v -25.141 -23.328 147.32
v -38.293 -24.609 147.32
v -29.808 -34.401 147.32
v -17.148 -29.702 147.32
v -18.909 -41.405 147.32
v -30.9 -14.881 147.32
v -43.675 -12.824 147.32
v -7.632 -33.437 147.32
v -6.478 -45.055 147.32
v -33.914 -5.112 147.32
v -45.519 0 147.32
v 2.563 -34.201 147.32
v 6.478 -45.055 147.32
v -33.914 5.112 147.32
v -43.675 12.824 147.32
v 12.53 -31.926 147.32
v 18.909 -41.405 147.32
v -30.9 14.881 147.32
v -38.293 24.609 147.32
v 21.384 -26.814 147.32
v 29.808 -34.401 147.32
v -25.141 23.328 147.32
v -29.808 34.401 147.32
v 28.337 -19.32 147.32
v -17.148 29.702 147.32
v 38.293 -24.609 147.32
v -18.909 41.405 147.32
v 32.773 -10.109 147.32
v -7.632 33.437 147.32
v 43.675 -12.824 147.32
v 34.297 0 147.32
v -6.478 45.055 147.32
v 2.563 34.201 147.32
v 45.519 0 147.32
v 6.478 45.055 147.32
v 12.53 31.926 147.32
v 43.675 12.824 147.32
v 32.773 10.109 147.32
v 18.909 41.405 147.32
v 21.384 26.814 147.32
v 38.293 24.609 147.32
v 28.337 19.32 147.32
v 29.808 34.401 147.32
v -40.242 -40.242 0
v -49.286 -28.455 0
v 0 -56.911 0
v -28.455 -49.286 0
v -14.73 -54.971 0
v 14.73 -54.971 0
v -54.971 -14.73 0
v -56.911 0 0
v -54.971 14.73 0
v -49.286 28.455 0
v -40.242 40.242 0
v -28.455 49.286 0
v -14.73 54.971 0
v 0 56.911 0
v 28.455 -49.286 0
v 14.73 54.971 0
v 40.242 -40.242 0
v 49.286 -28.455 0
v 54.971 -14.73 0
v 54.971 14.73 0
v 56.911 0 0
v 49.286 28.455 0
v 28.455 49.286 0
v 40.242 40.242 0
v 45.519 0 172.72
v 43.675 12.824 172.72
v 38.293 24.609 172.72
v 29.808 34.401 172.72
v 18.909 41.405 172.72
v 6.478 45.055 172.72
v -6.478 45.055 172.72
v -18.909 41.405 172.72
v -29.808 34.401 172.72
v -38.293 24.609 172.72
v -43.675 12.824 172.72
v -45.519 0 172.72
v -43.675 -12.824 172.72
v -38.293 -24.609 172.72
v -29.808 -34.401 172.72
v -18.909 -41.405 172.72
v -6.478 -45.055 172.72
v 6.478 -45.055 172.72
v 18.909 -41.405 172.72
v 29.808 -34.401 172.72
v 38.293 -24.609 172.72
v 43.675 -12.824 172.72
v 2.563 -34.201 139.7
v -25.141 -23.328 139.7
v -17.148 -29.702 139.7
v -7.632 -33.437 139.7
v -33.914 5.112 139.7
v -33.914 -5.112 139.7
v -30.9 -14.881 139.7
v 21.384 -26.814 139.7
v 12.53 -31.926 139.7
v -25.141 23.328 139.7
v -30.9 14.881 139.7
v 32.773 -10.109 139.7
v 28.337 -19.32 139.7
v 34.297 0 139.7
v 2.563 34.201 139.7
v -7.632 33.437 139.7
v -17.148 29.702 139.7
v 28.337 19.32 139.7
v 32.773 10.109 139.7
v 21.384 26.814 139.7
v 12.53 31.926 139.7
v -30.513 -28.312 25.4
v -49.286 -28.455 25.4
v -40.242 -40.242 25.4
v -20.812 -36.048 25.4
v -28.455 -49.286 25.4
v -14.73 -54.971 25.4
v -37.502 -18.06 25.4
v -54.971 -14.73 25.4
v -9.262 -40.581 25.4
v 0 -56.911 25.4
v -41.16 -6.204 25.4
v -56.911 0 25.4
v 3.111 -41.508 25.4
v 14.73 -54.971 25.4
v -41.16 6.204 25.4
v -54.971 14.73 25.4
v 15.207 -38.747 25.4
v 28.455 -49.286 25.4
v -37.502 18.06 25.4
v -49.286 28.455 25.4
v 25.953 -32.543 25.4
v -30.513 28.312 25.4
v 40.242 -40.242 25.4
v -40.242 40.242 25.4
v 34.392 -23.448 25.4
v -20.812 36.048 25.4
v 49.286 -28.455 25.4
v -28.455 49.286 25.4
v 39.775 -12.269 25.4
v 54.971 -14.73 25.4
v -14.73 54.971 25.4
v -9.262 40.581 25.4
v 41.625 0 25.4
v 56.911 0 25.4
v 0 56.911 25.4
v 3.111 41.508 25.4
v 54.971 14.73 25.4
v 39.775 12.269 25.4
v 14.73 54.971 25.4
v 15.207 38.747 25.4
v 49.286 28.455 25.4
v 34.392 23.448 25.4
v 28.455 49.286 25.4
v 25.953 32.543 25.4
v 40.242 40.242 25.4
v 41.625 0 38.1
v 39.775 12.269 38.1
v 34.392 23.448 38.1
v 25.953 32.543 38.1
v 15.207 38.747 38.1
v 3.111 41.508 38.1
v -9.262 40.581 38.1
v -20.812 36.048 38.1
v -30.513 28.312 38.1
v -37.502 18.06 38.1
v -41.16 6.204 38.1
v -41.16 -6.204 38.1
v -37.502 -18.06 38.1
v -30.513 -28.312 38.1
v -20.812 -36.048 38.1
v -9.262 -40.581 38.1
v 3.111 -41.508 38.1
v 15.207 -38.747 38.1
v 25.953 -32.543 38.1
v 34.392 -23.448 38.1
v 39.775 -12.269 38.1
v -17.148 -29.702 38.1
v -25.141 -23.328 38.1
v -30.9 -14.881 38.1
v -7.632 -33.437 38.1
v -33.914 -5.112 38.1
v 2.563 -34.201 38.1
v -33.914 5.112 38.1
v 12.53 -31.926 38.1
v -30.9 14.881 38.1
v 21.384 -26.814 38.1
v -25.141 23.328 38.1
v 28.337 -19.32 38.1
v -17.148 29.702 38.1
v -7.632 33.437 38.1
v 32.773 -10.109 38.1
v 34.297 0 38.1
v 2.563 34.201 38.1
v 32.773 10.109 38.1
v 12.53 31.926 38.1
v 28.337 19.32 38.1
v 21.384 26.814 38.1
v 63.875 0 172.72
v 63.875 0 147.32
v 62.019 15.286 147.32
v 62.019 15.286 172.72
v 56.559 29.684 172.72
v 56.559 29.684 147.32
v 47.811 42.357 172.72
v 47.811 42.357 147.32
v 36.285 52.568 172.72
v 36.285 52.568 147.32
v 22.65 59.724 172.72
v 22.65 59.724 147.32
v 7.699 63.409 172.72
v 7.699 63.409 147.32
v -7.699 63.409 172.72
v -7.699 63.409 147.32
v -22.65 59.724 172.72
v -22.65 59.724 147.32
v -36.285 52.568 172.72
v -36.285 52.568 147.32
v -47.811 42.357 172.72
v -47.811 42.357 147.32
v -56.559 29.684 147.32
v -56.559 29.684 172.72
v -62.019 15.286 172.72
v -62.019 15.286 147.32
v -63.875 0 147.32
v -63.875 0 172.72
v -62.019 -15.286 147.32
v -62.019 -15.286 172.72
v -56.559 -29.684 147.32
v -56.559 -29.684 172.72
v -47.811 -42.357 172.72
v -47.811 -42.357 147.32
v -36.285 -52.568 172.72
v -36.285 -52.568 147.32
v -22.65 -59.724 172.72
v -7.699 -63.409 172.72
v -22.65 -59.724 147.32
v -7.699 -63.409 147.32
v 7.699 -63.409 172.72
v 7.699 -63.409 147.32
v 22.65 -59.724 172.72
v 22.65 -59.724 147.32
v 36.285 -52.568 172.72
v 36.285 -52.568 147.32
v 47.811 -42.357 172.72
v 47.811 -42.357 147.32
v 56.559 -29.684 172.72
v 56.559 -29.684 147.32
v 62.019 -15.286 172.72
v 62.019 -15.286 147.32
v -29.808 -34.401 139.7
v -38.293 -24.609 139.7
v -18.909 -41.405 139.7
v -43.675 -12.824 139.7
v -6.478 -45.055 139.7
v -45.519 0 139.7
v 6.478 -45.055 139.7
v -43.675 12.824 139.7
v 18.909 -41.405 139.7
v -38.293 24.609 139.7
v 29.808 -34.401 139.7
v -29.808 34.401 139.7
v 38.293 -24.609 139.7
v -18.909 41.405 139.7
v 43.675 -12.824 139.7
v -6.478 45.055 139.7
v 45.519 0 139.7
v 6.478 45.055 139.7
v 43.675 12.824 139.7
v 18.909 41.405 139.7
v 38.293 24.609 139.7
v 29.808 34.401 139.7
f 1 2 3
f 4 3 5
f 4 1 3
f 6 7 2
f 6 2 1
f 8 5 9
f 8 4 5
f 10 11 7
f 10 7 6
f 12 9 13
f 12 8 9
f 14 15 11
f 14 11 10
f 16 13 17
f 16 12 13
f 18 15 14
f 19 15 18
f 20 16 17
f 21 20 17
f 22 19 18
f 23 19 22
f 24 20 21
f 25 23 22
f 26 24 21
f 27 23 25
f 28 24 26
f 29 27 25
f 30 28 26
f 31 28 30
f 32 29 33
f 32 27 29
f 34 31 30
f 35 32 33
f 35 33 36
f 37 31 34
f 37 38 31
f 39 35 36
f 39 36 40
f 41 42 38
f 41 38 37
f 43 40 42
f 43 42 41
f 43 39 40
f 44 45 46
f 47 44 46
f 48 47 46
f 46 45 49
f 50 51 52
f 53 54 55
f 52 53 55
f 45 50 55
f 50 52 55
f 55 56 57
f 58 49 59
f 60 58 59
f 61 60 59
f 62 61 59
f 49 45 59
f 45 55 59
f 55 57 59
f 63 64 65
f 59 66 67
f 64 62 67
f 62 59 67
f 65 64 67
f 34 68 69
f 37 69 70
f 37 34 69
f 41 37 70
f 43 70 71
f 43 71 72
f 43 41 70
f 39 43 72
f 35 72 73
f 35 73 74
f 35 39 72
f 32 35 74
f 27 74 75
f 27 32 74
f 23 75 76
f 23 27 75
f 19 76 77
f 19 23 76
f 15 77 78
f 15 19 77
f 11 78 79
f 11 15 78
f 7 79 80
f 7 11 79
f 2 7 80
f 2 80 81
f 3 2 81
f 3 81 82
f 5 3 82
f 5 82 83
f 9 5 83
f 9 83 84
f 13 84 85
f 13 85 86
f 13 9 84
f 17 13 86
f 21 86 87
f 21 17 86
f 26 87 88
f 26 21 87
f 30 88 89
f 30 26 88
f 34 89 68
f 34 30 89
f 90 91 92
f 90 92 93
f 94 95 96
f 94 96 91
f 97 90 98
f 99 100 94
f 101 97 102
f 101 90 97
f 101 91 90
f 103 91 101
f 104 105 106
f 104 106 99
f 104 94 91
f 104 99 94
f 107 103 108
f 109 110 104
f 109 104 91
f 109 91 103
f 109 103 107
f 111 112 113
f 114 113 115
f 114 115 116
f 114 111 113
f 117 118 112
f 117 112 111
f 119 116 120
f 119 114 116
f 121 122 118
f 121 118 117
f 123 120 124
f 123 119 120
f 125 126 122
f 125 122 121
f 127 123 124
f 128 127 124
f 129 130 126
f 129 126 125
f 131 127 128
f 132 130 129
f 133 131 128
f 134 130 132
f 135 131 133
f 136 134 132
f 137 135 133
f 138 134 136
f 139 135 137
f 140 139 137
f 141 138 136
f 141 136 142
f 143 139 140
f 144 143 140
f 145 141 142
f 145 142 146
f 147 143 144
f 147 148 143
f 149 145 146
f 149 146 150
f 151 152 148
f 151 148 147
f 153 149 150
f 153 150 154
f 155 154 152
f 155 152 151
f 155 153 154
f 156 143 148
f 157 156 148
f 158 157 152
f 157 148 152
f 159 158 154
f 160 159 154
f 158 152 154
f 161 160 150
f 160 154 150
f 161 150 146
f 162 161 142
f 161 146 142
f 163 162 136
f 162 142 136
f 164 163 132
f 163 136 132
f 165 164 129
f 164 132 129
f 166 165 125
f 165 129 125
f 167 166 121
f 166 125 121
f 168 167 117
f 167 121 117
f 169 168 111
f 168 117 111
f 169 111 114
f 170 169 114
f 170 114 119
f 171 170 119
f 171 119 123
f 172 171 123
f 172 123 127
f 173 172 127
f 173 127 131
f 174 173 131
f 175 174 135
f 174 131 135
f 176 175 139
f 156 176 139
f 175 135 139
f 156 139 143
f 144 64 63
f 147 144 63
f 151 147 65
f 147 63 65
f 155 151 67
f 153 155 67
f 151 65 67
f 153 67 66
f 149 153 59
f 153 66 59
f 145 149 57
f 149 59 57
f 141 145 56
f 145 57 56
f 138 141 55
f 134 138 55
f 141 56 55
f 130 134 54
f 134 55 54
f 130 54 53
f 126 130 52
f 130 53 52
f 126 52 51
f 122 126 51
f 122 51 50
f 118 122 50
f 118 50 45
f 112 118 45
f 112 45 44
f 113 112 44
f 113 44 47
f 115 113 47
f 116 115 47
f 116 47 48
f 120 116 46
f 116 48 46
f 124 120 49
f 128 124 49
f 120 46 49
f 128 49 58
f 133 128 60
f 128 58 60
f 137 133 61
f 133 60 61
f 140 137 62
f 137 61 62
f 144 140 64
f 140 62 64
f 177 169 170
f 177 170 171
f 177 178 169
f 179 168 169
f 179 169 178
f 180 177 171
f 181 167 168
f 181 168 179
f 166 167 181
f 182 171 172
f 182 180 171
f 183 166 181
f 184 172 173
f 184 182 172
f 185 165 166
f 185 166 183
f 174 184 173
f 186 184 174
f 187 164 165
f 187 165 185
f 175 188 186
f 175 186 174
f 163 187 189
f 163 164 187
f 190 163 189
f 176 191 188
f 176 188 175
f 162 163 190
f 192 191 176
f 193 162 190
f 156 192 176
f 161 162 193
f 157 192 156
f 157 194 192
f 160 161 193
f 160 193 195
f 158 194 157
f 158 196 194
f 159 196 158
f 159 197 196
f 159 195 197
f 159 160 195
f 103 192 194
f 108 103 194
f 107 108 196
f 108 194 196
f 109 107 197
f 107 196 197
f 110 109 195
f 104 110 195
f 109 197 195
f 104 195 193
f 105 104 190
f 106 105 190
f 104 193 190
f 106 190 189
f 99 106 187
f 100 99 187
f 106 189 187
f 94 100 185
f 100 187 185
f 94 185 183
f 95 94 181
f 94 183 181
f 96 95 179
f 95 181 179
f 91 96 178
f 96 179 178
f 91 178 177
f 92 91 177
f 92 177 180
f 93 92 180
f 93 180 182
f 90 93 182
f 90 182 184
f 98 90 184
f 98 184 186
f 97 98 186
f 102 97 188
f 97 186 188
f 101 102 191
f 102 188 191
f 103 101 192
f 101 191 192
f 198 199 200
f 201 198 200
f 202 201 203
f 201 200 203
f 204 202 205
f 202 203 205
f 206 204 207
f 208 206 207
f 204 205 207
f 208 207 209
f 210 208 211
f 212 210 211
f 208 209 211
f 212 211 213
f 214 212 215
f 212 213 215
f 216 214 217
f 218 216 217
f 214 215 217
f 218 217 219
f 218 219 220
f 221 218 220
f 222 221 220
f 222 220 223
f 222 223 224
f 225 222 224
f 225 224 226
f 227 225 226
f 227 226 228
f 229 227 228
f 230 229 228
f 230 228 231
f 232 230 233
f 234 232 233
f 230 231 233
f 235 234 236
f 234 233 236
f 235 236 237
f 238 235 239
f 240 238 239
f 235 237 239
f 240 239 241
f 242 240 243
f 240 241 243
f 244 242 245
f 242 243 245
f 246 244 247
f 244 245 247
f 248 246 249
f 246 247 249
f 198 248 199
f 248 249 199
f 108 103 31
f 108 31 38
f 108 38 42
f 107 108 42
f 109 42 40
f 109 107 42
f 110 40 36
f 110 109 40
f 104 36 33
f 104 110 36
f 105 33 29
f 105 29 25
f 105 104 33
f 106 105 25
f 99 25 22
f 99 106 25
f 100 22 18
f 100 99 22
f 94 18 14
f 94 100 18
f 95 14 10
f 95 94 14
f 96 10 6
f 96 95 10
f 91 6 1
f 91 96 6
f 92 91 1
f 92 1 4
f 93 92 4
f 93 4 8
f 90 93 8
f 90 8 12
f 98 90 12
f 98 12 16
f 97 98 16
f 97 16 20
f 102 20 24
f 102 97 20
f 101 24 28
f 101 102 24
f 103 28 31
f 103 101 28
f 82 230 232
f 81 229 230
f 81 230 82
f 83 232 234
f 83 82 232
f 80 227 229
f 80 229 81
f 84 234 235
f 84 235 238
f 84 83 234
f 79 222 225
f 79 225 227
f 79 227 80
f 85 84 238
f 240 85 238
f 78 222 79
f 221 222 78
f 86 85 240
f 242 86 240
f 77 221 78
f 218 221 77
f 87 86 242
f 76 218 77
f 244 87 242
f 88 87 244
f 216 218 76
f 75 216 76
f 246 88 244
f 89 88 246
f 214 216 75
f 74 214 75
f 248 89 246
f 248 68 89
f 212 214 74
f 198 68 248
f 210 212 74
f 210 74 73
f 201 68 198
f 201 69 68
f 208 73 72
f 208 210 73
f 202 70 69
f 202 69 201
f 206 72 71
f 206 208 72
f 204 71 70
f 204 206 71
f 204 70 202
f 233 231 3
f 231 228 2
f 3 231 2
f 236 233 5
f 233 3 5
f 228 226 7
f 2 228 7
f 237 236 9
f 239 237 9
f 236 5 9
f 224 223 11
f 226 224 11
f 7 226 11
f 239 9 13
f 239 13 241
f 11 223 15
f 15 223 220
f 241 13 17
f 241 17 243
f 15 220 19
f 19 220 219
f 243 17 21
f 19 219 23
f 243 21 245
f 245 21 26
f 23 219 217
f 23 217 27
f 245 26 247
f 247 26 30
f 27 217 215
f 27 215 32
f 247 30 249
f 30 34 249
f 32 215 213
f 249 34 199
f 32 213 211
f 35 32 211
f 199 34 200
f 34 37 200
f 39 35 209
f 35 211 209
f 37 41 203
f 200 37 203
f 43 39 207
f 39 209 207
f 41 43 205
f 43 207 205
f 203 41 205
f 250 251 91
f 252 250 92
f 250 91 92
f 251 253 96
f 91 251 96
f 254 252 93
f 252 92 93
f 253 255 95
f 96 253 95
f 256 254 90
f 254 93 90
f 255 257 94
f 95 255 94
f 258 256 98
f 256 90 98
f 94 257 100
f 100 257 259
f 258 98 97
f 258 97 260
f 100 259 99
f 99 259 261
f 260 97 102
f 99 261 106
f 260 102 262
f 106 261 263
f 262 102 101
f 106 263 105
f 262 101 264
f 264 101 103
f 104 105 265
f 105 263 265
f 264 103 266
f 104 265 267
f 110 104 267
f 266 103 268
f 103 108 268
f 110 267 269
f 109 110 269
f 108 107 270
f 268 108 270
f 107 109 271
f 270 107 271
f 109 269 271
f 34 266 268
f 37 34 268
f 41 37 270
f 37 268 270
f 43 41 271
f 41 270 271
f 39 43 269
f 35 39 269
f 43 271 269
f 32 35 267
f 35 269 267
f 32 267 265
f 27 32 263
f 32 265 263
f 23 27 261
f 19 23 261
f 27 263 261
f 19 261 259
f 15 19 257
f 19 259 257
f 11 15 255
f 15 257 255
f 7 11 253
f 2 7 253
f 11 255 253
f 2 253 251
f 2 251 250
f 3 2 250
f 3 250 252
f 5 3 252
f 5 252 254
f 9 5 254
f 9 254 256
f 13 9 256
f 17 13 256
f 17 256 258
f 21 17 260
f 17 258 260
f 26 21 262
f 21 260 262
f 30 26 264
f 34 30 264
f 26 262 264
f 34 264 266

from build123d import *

# Parameters (mm, degrees)
F0_R     = 56.9105887924
F1_DEPTH = 25.4
F2_R     = 41.624583829
F3_DEPTH = 12.7
F4_R     = 34.2968724553
F5_DEPTH = 101.6
F6_R     = 45.5185449465
F6_R_2   = 34.2968724553
F7_DEPTH = 7.62
F8_R     = 63.8752045079
F8_R_2   = 45.5185449465
F9_DEPTH = 25.4


with BuildPart() as f1:
    # F0 (on Top) → F1 (new body)
    with BuildSketch(Plane.XY):
        Circle(F0_R)
    extrude(amount=F1_DEPTH)

    # F2 (on face) → F3 (join)
    with BuildSketch(Plane.XY.offset(25.4)):
        Circle(F2_R)
    extrude(amount=F3_DEPTH)

    # F4 (on face) → F5 (join)
    with BuildSketch(Plane.XY.offset(38.1)):
        Circle(F4_R)
    extrude(amount=F5_DEPTH)


with BuildPart() as f7:
    # F6 (on face) → F7 (new body)
    with BuildSketch(Plane.XY.offset(139.7)):
        Circle(F6_R)
        Circle(F6_R_2, mode=Mode.SUBTRACT)
    extrude(amount=F7_DEPTH)


with BuildPart() as f9:
    # F8 (on face) → F9 (new body)
    with BuildSketch(Plane.XY.offset(147.32)):
        Circle(F8_R)
        Circle(F8_R_2, mode=Mode.SUBTRACT)
    extrude(amount=F9_DEPTH)


solid = Compound([f1.part, f7.part, f9.part])
